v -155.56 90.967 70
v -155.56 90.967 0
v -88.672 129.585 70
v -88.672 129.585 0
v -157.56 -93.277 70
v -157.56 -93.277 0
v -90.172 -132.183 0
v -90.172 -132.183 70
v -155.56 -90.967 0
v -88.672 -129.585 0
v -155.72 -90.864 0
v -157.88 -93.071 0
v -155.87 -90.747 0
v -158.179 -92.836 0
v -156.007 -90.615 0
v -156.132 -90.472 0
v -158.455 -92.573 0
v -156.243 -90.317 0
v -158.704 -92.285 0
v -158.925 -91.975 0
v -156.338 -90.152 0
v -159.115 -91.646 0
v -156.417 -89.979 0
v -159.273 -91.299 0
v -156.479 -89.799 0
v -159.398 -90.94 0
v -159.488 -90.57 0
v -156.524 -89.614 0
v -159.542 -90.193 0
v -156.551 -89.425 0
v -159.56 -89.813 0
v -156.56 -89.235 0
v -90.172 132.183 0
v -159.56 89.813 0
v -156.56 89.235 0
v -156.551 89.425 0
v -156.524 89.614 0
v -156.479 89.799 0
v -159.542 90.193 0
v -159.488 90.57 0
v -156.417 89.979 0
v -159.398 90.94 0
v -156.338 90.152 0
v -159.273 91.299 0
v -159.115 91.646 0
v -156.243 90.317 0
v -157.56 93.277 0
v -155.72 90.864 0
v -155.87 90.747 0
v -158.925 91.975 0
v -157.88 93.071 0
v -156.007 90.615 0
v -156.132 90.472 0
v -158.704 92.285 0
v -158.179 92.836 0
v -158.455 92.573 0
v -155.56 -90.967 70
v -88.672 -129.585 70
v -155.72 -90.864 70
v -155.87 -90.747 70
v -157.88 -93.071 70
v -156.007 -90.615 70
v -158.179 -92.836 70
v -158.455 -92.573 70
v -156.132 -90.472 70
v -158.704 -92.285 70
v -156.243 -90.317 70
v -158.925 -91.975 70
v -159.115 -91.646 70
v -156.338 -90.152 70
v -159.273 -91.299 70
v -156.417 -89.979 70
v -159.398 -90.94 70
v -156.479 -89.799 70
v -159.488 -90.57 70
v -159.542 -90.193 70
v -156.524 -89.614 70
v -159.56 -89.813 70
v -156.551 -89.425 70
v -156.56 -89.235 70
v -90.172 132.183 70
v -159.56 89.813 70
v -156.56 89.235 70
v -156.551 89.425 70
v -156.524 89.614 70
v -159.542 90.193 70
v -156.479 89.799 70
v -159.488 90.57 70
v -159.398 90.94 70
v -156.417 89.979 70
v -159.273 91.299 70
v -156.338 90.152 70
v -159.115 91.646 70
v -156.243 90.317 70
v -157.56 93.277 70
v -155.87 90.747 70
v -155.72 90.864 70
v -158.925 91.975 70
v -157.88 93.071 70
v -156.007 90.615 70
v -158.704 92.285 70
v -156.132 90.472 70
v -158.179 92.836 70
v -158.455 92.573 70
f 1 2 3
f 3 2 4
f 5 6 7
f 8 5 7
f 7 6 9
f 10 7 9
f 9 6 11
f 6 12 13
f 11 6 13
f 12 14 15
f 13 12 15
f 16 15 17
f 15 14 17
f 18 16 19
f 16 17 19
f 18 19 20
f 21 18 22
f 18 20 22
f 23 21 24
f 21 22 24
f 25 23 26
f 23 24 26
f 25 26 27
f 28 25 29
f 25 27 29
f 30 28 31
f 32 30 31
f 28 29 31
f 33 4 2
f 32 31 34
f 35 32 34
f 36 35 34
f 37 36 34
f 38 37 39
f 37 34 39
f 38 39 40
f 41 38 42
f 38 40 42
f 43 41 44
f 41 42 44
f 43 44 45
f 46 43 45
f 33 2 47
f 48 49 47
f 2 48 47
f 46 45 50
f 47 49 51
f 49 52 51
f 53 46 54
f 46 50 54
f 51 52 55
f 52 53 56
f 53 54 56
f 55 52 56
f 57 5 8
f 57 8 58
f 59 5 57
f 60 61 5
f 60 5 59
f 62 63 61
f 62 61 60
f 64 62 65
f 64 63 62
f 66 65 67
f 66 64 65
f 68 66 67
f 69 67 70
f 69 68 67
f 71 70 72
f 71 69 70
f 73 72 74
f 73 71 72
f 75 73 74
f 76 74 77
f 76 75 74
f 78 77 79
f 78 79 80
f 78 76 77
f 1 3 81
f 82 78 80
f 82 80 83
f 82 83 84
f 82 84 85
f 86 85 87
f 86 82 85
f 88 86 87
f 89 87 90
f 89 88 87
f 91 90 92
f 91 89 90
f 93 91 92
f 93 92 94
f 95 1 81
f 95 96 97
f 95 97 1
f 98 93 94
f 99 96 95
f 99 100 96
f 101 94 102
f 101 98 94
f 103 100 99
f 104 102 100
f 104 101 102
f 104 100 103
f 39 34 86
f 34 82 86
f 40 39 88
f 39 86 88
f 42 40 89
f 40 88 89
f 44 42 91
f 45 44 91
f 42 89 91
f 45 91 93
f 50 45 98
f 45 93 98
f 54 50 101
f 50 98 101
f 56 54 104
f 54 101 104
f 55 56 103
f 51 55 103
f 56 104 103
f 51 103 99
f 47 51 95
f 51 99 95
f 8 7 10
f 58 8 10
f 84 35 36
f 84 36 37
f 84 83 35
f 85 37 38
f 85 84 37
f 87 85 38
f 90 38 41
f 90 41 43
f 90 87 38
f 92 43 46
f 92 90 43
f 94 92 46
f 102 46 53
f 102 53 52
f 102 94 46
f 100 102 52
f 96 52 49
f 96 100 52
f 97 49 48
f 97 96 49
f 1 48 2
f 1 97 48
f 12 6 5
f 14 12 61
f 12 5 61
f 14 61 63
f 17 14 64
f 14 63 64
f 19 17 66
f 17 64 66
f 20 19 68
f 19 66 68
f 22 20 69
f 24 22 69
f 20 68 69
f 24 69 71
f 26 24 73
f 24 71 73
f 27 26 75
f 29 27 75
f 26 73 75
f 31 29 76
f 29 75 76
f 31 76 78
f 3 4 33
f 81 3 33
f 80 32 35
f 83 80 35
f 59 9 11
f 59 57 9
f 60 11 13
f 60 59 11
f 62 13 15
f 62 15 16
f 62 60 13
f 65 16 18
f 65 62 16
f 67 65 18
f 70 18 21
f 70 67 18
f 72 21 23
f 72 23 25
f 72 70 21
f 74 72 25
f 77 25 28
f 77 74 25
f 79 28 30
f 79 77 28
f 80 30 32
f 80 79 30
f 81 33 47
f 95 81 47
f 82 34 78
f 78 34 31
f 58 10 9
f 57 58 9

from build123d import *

# Parameters (mm, degrees)
SALIENTE_EXTRUIR1_DEPTH = 70
REDONDEO1_R             = 2
REDONDEO2_R             = 4


with BuildPart() as part:
    # Croquis1 → Saliente-Extruir1 (new body)
    with BuildSketch(Plane(origin=(0, 0, 0), x_dir=(0, 1, 0), z_dir=(0, 0, 1))):
        Polygon((-129.584937216, 88.672304845), (-90.389958144, 156.56), (90.389958144, 156.56), (129.584937216, 88.672304845), (132.183013428, 90.172304845), (92.122008952, 159.56), (-92.122008952, 159.56), (-132.183013428, 90.172304845), align=None)
    extrude(amount=SALIENTE_EXTRUIR1_DEPTH)

    # Redondeo1
    redondeo1_edges = [part.edges().sort_by_distance(p)[0] for p in [
        (-156.56, 90.389958144, 35),
        (-156.56, -90.389958144, 35),
    ]]
    fillet(redondeo1_edges, radius=REDONDEO1_R)

    # Redondeo2
    redondeo2_edges = [part.edges().sort_by_distance(p)[0] for p in [
        (-159.56, -92.122008952, 35),
        (-159.56, 92.122008952, 35),
    ]]
    fillet(redondeo2_edges, radius=REDONDEO2_R)


solid = part.part
